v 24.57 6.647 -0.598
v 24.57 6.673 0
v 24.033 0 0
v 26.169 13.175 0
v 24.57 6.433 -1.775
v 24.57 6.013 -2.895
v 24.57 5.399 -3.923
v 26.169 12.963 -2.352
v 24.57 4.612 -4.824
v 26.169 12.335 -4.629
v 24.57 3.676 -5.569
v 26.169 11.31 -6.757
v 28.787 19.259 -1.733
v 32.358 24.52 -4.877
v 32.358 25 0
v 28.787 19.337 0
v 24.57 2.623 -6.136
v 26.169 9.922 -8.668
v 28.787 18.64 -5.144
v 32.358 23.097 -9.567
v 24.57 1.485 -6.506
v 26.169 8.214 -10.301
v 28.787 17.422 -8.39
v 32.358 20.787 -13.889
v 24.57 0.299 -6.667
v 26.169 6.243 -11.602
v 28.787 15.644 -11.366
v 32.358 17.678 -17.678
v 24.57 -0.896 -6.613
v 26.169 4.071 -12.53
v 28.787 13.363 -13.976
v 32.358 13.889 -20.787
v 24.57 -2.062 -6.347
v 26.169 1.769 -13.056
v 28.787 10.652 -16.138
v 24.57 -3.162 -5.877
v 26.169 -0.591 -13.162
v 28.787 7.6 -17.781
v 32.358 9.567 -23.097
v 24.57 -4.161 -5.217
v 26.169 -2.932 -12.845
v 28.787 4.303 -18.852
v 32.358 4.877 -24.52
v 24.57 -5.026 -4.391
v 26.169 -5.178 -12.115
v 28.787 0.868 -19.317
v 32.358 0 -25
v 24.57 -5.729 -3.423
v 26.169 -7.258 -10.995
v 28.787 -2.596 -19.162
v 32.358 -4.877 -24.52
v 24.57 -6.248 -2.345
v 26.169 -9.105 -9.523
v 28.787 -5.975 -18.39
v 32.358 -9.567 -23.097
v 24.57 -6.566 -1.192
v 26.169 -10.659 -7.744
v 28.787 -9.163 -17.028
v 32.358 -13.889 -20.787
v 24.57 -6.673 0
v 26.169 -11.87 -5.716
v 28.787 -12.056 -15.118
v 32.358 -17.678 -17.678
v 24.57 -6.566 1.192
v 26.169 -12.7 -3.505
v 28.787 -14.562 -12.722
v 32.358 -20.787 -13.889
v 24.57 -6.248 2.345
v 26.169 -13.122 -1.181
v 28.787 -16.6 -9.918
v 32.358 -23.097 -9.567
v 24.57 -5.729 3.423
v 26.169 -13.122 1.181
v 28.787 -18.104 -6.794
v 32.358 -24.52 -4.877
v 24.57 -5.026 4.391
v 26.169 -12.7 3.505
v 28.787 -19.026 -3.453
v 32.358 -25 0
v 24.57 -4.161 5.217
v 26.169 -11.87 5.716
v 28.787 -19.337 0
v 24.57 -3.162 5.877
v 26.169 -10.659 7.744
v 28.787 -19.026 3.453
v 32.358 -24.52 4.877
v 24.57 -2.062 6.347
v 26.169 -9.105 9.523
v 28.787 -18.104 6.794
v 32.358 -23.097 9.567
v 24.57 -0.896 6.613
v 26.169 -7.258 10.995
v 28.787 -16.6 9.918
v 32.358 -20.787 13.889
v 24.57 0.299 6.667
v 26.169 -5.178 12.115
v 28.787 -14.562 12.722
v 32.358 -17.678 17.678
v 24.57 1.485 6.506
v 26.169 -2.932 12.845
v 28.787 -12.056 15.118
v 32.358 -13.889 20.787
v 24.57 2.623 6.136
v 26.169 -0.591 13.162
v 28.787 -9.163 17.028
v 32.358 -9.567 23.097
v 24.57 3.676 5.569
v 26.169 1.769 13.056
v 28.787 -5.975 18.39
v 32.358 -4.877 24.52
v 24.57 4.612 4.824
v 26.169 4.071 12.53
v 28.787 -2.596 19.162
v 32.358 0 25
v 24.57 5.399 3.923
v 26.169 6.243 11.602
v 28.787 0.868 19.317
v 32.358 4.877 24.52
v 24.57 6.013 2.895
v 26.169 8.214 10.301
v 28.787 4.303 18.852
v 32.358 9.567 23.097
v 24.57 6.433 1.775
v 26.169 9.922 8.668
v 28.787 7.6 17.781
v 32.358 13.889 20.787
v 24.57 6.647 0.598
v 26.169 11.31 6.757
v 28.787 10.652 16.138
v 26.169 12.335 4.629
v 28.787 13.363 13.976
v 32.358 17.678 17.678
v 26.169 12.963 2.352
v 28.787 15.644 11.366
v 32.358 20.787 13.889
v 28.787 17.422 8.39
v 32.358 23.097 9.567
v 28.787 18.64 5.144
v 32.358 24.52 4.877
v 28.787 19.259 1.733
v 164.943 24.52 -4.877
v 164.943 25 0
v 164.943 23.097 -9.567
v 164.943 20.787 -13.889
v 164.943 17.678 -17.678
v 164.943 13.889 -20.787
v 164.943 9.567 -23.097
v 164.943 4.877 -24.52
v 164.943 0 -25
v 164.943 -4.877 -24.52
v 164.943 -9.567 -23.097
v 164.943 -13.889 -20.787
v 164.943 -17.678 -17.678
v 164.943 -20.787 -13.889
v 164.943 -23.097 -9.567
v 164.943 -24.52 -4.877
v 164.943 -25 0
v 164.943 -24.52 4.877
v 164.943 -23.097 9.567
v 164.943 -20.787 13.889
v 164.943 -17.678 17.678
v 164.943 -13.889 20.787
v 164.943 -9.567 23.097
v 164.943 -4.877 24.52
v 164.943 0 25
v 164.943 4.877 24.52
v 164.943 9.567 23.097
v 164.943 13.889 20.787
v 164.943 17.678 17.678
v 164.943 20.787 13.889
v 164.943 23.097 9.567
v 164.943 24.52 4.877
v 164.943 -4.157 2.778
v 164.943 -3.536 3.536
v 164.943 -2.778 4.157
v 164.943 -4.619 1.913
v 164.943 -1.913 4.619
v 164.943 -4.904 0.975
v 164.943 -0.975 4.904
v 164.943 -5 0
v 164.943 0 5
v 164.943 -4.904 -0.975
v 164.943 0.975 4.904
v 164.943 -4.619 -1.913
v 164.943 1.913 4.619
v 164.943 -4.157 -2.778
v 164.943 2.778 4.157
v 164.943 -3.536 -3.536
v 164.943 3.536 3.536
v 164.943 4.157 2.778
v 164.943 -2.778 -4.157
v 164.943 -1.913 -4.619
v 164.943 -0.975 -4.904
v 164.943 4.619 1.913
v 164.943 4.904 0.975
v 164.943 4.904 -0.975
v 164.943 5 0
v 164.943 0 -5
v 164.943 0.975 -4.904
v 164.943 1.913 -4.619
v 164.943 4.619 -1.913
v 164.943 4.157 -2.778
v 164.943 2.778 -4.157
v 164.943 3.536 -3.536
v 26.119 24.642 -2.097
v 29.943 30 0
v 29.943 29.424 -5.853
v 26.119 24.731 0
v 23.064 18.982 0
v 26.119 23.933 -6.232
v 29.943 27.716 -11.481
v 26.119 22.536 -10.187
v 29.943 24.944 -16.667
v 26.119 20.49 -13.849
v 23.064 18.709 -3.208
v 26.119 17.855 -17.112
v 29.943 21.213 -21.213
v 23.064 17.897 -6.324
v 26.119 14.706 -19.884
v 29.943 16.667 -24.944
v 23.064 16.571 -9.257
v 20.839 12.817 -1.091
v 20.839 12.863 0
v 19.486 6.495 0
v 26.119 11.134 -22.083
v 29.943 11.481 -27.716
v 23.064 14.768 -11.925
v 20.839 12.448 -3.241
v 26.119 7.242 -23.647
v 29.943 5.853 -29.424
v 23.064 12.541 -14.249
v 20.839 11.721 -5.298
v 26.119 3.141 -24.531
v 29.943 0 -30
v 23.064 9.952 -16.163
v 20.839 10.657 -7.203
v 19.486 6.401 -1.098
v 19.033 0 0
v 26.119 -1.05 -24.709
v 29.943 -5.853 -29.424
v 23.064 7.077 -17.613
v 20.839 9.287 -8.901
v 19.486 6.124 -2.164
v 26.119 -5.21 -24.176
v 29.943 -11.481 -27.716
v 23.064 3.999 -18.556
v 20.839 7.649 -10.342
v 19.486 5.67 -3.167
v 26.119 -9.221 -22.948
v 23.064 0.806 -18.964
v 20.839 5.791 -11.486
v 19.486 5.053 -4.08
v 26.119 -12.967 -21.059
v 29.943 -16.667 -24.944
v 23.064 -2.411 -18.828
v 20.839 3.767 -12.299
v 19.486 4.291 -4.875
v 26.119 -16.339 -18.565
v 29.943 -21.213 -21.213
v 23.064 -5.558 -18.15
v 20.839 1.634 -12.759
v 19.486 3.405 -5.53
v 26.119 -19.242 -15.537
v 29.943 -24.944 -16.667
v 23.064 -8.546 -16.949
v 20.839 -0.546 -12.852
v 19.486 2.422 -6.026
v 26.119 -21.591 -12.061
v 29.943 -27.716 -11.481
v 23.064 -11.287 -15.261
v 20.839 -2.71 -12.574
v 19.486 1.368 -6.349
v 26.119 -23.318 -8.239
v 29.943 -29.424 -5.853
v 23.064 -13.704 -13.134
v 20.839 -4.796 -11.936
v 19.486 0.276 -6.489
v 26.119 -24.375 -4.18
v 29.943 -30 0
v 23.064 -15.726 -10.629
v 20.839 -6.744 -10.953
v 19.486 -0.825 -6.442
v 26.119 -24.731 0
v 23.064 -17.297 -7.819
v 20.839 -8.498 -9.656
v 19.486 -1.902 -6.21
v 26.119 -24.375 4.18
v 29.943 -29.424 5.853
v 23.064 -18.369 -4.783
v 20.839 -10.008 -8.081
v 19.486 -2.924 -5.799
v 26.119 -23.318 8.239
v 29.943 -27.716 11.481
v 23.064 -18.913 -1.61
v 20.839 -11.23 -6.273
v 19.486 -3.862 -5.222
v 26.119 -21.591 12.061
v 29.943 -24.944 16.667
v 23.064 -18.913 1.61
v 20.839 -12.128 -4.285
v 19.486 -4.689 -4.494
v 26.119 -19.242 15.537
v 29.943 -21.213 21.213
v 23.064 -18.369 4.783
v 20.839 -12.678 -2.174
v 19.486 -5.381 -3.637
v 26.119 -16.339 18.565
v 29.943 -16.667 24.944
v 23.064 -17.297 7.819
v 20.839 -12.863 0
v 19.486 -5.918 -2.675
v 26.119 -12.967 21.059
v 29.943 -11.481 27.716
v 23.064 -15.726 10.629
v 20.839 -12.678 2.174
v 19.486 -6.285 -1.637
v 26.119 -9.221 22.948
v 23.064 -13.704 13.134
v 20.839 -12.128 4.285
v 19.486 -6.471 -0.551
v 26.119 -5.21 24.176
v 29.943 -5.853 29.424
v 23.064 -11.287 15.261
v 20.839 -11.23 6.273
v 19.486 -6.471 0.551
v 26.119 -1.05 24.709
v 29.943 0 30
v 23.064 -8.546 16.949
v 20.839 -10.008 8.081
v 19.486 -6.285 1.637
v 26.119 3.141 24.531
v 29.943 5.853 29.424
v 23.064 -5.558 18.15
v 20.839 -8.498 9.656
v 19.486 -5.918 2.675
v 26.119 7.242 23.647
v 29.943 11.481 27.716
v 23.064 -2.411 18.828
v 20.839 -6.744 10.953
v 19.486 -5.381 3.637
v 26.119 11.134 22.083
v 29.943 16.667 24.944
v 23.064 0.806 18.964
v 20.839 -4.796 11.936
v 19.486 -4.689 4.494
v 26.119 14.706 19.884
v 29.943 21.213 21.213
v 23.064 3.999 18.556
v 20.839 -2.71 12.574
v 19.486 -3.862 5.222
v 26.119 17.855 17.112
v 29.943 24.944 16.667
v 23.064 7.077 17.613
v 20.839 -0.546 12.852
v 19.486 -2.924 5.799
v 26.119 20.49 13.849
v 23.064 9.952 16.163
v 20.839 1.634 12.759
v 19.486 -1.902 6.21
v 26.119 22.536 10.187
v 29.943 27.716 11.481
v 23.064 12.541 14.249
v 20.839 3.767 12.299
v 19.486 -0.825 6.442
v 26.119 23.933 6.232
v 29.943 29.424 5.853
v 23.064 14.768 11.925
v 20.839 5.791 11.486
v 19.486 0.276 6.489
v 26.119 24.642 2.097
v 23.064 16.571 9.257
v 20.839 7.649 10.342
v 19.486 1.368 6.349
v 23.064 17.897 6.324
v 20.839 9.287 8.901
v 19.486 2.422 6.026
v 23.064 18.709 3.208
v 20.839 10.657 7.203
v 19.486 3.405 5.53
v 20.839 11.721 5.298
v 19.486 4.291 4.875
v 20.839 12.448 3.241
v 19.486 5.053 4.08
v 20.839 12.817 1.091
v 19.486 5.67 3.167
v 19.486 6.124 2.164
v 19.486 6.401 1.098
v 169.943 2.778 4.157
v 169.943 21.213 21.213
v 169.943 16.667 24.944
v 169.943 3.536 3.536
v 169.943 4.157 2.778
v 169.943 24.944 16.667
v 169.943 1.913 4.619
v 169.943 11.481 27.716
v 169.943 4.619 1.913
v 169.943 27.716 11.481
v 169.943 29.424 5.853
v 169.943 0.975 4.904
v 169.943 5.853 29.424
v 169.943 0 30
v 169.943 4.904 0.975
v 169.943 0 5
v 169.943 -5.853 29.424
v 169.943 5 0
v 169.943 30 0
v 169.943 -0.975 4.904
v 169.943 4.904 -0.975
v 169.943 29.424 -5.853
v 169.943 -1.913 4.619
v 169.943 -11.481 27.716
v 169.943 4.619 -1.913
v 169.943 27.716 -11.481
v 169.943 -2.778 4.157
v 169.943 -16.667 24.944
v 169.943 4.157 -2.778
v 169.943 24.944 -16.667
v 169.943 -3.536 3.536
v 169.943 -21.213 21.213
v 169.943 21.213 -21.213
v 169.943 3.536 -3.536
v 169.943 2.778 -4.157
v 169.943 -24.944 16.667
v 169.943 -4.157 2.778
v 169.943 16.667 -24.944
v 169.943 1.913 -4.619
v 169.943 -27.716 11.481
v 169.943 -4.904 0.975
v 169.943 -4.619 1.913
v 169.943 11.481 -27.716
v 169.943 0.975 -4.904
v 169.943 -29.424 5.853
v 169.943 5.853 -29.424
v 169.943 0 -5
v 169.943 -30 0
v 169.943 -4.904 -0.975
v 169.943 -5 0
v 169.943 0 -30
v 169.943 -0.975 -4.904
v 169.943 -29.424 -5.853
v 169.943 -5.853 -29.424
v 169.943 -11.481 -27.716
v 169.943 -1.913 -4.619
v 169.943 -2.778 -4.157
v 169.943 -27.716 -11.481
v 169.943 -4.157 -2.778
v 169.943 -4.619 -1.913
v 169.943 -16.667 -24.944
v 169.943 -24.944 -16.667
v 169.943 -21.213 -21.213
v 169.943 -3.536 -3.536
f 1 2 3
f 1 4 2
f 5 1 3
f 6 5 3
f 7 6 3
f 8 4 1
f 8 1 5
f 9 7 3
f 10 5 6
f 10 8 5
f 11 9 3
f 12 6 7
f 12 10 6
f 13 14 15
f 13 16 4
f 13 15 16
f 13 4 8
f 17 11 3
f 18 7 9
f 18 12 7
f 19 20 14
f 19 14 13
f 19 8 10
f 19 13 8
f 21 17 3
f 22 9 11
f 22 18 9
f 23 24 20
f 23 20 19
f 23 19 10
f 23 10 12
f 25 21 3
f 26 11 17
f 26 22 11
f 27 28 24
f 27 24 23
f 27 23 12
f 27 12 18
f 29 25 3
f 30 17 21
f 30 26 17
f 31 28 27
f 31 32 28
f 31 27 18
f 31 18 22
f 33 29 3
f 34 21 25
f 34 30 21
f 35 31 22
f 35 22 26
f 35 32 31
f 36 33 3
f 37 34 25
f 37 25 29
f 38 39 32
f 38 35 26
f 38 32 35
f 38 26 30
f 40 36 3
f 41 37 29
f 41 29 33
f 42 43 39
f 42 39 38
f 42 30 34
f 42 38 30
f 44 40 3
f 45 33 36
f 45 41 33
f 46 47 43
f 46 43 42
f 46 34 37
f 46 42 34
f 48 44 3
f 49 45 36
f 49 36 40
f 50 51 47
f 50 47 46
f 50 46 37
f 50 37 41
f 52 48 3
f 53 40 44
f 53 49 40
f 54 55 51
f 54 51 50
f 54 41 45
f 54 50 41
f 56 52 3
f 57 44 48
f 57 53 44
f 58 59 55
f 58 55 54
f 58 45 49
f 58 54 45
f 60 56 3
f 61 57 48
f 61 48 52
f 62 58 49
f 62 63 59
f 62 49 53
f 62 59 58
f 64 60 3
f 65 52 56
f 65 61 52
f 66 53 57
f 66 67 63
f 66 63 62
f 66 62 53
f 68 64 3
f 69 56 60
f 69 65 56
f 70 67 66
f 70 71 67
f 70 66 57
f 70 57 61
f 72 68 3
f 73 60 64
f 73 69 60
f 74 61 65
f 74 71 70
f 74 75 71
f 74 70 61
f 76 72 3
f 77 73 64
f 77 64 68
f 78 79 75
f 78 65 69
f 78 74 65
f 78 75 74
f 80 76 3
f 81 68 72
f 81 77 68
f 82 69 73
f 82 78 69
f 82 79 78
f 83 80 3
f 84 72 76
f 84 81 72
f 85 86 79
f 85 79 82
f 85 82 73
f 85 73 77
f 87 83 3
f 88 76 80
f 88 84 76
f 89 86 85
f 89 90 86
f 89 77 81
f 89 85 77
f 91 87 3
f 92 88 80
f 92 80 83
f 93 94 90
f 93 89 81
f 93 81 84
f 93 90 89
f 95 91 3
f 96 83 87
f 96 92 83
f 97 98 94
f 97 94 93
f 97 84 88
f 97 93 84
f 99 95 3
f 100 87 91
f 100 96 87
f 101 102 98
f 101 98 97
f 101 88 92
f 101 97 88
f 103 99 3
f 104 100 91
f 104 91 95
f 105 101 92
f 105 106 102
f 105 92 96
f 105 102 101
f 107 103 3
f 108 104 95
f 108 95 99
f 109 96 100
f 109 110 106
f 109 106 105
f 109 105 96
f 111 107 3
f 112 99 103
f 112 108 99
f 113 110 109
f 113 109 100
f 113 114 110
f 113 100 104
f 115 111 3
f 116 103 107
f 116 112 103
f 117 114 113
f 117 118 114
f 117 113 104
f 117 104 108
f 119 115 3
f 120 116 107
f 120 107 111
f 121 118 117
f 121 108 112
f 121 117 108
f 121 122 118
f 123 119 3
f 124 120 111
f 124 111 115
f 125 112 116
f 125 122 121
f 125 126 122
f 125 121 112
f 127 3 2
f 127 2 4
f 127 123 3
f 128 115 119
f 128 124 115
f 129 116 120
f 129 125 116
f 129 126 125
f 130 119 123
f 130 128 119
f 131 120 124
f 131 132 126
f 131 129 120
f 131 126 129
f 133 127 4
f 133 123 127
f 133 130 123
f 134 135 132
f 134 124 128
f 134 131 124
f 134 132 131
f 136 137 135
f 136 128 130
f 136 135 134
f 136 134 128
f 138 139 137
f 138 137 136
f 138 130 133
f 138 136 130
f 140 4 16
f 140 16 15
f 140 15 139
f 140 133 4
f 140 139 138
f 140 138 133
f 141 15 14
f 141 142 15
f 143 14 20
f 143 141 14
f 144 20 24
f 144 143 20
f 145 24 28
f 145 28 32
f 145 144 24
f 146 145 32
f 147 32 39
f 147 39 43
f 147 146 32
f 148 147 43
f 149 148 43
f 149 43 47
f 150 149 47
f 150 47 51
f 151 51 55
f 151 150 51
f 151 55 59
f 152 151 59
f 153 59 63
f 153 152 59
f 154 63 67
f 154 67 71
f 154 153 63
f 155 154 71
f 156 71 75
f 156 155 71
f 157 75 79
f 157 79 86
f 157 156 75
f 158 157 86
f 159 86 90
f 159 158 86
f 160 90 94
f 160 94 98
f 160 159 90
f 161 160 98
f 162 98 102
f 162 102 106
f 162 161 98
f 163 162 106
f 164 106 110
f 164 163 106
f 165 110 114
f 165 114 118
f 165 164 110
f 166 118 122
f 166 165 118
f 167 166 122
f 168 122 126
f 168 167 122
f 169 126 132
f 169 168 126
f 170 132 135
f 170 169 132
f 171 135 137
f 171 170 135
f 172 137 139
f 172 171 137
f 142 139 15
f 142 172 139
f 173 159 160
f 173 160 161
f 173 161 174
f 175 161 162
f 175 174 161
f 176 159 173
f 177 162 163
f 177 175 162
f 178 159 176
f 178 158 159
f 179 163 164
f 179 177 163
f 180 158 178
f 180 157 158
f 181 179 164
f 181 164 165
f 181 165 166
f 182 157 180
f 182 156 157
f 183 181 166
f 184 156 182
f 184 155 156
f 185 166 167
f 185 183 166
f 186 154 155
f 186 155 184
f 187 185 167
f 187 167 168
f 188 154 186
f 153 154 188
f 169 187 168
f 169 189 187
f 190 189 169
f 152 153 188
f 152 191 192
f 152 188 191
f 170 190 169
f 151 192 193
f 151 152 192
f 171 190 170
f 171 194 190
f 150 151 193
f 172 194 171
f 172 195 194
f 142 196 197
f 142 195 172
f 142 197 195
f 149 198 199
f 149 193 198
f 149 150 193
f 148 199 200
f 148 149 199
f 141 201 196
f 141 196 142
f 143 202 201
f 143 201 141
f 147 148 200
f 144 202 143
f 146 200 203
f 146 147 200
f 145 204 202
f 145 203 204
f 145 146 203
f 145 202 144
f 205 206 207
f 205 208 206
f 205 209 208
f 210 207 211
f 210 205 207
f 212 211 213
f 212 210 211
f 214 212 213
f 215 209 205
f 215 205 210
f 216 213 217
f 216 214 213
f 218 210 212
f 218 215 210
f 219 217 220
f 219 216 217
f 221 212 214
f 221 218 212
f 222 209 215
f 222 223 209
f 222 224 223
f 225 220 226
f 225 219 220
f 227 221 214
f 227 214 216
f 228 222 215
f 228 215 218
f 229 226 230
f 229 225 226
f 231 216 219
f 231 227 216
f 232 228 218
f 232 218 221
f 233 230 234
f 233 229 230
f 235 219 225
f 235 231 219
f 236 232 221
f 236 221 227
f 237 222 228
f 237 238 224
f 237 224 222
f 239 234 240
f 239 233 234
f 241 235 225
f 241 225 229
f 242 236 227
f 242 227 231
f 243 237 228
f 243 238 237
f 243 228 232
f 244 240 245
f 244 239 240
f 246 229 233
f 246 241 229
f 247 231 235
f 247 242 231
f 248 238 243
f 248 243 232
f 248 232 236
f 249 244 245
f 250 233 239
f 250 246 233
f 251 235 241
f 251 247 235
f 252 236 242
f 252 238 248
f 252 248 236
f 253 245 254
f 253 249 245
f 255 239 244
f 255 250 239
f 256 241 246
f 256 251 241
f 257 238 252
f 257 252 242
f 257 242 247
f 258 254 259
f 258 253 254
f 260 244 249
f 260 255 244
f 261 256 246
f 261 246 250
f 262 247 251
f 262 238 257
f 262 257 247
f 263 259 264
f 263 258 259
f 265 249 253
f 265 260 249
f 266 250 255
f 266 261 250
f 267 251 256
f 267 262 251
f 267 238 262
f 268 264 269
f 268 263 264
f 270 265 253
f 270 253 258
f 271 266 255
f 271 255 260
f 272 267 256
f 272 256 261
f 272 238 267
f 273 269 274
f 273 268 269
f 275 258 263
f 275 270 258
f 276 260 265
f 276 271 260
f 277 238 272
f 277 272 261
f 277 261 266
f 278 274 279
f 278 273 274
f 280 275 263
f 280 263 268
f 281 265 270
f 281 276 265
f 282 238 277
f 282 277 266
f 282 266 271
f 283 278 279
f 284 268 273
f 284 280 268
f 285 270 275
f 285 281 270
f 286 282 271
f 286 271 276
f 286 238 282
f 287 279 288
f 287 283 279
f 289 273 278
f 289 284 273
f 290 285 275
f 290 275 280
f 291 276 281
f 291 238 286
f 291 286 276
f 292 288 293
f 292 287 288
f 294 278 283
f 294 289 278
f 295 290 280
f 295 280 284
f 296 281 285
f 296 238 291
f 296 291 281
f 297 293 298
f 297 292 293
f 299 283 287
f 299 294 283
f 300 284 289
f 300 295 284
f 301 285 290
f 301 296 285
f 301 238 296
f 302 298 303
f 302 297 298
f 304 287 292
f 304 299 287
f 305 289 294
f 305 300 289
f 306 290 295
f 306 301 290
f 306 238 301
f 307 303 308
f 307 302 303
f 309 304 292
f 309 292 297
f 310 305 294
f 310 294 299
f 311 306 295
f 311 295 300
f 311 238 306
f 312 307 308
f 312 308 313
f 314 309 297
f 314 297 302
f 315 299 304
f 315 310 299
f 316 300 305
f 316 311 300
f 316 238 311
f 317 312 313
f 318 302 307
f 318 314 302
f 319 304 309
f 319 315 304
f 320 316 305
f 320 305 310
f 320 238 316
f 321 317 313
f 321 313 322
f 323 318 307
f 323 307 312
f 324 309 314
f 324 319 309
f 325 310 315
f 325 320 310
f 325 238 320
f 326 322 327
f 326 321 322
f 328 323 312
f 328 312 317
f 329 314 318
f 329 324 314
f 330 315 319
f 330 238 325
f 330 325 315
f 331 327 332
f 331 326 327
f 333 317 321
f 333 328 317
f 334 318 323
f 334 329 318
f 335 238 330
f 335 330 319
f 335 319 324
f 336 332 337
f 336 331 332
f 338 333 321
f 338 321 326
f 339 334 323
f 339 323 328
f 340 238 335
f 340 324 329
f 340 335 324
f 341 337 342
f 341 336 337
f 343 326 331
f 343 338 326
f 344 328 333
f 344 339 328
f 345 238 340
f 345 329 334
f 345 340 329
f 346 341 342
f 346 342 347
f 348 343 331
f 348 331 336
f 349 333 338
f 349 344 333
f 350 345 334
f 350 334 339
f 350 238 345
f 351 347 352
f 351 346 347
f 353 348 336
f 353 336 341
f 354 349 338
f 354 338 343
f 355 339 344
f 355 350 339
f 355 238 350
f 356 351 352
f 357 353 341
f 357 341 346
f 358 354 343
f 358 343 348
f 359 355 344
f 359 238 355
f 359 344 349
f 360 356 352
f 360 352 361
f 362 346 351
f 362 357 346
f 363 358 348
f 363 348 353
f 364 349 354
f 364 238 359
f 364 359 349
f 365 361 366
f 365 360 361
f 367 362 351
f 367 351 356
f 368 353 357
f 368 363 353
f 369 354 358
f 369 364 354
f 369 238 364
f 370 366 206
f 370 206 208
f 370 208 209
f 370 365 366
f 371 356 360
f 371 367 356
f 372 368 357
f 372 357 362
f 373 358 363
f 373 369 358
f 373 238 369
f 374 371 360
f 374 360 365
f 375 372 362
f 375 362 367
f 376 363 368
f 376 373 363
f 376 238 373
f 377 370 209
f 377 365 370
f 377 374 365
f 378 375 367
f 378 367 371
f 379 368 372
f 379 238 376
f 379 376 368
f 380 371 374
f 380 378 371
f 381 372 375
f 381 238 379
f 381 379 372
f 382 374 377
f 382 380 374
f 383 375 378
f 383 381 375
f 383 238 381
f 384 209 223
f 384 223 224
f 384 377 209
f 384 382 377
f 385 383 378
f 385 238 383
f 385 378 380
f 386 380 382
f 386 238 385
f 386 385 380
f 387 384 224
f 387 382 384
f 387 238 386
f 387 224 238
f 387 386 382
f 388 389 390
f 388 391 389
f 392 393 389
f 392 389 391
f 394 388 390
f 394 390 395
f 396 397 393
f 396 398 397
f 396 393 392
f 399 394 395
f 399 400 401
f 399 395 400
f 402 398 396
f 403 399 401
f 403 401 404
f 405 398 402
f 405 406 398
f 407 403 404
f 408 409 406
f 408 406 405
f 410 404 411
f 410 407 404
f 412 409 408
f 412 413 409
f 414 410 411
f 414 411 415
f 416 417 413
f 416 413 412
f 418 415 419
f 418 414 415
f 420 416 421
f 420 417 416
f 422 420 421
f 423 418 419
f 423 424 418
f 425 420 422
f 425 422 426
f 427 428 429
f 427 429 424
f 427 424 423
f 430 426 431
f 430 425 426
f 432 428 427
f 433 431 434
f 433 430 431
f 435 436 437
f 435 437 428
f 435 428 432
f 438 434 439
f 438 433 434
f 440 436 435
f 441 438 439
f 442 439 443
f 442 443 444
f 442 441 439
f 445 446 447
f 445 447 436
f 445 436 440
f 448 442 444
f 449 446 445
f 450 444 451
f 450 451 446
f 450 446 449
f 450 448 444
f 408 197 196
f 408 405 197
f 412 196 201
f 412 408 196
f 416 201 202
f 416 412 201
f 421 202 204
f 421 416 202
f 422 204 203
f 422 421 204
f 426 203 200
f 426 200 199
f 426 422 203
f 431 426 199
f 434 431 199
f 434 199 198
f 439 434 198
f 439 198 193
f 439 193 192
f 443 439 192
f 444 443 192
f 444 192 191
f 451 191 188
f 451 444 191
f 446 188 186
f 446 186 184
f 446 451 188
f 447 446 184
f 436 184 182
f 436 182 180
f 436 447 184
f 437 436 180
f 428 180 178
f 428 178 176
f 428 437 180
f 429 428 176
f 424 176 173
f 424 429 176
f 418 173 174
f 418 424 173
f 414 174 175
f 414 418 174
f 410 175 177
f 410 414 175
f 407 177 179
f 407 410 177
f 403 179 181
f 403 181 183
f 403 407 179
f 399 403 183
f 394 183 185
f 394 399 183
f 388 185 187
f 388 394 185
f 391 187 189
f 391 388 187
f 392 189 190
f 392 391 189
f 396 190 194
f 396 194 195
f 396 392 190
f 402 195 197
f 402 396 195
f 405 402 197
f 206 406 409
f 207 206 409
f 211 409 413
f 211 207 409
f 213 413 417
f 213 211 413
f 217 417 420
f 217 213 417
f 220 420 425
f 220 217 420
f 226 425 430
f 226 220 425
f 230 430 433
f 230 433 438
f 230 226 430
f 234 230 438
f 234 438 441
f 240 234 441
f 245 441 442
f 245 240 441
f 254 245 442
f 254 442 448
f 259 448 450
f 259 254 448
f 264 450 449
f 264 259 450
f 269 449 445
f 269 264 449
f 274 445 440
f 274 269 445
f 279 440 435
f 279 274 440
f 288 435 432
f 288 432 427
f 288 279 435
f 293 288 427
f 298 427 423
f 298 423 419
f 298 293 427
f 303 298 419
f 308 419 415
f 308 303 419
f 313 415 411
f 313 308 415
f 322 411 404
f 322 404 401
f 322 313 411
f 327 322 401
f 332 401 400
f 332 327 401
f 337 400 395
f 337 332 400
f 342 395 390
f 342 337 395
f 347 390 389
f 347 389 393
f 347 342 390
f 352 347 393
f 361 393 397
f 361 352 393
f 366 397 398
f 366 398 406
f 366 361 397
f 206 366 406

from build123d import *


with BuildPart() as part:
    # Sketch1 → Revolve6 (revolve)
    with BuildSketch(Plane.XY):
        with BuildLine():
            Line((169.943031877, 5), (169.943031877, 30))
            Line((169.943031877, 30), (29.943031877, 30))
            ThreePointArc((29.943031877, 30), (21.844861375, 15.961189352), (19.032566162, 0))
            Line((19.032566162, 0), (24.032566162, 0))
            ThreePointArc((24.032566162, 0), (26.168520101, 13.174839994), (32.357566788, 25))
            Line((32.357566788, 25), (164.943031877, 25))
            Line((164.943031877, 25), (164.943031877, 5))
            Line((164.943031877, 5), (169.943031877, 5))
        make_face()
    revolve(axis=Axis((0, 0, 0), (-1, 0, 0)))


solid = part.part
